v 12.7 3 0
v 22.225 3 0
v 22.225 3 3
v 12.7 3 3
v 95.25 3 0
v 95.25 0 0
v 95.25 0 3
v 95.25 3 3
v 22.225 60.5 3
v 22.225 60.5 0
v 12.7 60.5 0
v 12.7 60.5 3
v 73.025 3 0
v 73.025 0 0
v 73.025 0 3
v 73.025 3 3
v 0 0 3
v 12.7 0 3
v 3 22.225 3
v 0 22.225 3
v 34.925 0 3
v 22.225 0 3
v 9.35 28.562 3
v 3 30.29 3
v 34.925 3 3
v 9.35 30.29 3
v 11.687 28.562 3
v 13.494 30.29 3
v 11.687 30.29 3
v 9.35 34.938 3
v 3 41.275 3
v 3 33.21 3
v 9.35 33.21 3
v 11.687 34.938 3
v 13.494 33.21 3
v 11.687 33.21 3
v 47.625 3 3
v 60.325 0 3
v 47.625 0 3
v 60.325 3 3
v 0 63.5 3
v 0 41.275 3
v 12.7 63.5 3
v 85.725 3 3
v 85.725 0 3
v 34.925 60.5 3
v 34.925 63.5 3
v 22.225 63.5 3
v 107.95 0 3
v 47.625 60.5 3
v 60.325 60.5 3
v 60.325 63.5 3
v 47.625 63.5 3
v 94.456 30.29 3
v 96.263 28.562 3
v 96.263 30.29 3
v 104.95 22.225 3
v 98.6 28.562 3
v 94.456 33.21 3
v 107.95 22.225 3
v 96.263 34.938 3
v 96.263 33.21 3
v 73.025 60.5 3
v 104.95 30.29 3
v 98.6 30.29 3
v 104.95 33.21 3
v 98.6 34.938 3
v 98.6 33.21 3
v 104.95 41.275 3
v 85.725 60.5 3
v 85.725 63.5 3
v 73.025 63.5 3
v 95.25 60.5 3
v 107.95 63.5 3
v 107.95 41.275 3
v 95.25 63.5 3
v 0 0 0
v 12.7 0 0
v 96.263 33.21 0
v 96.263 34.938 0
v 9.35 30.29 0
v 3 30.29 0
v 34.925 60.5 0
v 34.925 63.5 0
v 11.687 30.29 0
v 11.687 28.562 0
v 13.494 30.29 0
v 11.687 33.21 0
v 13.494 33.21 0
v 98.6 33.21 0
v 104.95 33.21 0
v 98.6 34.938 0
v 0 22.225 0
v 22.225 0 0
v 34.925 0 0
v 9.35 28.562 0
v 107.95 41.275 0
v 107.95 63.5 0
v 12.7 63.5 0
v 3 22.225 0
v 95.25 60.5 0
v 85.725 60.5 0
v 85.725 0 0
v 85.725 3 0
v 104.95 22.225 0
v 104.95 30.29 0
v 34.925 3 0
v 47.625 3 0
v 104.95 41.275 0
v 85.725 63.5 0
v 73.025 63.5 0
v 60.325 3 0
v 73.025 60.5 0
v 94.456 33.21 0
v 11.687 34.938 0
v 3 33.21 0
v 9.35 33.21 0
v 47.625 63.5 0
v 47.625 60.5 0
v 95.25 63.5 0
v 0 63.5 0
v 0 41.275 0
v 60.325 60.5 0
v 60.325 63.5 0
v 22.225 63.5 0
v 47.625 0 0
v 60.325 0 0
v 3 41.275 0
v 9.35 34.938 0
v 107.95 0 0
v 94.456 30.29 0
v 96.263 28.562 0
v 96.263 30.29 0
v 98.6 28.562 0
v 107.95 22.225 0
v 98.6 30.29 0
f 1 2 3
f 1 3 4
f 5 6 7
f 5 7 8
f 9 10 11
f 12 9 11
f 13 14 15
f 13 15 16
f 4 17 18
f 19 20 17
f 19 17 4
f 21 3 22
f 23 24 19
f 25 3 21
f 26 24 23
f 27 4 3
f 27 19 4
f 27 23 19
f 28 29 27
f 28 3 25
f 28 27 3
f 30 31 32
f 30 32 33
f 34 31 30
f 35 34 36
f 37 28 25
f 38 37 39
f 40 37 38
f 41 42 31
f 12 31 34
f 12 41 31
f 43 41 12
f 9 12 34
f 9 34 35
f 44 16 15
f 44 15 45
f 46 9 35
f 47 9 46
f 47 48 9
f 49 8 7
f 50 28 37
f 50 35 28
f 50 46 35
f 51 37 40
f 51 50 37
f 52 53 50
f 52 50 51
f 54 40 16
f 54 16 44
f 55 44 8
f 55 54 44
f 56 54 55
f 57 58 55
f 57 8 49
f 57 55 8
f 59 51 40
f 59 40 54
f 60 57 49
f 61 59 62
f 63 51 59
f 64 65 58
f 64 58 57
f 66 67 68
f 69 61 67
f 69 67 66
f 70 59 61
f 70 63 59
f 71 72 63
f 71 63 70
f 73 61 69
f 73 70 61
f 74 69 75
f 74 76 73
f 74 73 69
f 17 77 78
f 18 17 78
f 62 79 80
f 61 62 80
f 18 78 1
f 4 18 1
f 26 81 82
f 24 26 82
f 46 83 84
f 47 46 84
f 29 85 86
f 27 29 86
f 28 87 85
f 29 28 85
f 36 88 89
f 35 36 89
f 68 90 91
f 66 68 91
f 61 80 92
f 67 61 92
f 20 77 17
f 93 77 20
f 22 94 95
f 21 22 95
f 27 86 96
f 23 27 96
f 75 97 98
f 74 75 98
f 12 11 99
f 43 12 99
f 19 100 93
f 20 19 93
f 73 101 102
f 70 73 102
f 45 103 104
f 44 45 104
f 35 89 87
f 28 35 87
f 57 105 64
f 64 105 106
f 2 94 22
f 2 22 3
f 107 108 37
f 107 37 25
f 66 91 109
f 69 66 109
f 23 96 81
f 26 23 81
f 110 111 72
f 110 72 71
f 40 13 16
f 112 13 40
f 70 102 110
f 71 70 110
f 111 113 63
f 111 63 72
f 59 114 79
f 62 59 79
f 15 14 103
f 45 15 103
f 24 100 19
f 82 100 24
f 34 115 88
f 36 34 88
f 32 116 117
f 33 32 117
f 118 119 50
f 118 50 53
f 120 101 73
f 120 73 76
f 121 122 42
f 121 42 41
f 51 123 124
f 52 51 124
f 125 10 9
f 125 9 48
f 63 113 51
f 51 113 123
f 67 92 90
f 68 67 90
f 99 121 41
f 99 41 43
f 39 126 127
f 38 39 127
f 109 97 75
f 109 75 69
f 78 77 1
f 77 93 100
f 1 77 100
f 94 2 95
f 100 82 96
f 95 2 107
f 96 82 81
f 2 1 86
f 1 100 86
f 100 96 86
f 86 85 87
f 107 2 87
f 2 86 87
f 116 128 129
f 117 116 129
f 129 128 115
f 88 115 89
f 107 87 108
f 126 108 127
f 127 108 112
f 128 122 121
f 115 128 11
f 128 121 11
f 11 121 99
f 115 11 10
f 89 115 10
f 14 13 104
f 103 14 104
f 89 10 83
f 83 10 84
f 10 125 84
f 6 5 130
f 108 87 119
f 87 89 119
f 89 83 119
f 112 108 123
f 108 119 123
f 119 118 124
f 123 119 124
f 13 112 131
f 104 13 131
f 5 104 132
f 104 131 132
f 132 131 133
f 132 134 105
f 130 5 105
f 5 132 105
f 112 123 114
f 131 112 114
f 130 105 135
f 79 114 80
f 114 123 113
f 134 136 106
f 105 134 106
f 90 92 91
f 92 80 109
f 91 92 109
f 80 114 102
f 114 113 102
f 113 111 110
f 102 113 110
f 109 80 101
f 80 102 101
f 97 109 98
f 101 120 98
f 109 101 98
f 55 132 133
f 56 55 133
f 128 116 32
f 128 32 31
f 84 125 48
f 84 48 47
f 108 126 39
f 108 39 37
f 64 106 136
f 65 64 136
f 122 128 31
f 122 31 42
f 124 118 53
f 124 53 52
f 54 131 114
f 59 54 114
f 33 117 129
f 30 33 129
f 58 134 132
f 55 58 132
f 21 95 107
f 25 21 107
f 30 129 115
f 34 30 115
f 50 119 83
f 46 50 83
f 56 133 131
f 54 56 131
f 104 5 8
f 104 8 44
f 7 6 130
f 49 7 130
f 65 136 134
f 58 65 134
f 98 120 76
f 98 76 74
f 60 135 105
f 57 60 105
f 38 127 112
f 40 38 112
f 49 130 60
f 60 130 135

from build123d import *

# Parameters (mm, degrees)
SKETCH1_W           = 107.95
SKETCH1_H           = 63.5
BOSS_EXTRUDE1_DEPTH = 3
CUT_EXTRUDE1_REACH  = 127.278
SKETCH2_W           = 12.7
SKETCH2_H           = 3
SKETCH2_W_2         = 9.525
SKETCH2_W_3         = 3
SKETCH2_H_2         = 19.05
CUT_EXTRUDE2_REACH  = 127.278


with BuildPart() as part:
    # Sketch1 → Boss-Extrude1 (new body)
    with BuildSketch(Plane.XY):
        with Locations((53.975, 31.75)):
            Rectangle(SKETCH1_W, SKETCH1_H)
    extrude(amount=BOSS_EXTRUDE1_DEPTH)

    # Sketch2 → Cut-Extrude1 (cut, up to next)
    with BuildSketch(Plane(origin=(0, 0, 0), x_dir=(-1, 0, 0), z_dir=(0, 0, -1)), mode=Mode.PRIVATE) as cut_extrude1_sk1:
        with Locations((-66.675, 1.5)):
            Rectangle(SKETCH2_W, SKETCH2_H)
    cut_extrude1_tool1 = extrude(cut_extrude1_sk1.sketch, amount=-CUT_EXTRUDE1_REACH, mode=Mode.PRIVATE) & part.part
    # Sketch2 → Cut-Extrude1 (cut, up to next)
    with BuildSketch(Plane(origin=(0, 0, 0), x_dir=(-1, 0, 0), z_dir=(0, 0, -1)), mode=Mode.PRIVATE) as cut_extrude1_sk2:
        with Locations((-17.4625, 1.5)):
            Rectangle(SKETCH2_W_2, SKETCH2_H)
    cut_extrude1_tool2 = extrude(cut_extrude1_sk2.sketch, amount=-CUT_EXTRUDE1_REACH, mode=Mode.PRIVATE) & part.part
    # Sketch2 → Cut-Extrude1 (cut, up to next)
    with BuildSketch(Plane(origin=(0, 0, 0), x_dir=(-1, 0, 0), z_dir=(0, 0, -1)), mode=Mode.PRIVATE) as cut_extrude1_sk3:
        with Locations((-90.4875, 1.5)):
            Rectangle(SKETCH2_W_2, SKETCH2_H)
    cut_extrude1_tool3 = extrude(cut_extrude1_sk3.sketch, amount=-CUT_EXTRUDE1_REACH, mode=Mode.PRIVATE) & part.part
    # Sketch2 → Cut-Extrude1 (cut, up to next)
    with BuildSketch(Plane(origin=(0, 0, 0), x_dir=(-1, 0, 0), z_dir=(0, 0, -1)), mode=Mode.PRIVATE) as cut_extrude1_sk4:
        with Locations((-41.275, 1.5)):
            Rectangle(SKETCH2_W, SKETCH2_H)
    cut_extrude1_tool4 = extrude(cut_extrude1_sk4.sketch, amount=-CUT_EXTRUDE1_REACH, mode=Mode.PRIVATE) & part.part
    # Sketch2 → Cut-Extrude1 (cut, up to next)
    with BuildSketch(Plane(origin=(0, 0, 0), x_dir=(-1, 0, 0), z_dir=(0, 0, -1)), mode=Mode.PRIVATE) as cut_extrude1_sk5:
        with Locations((-41.275, 62)):
            Rectangle(SKETCH2_W, SKETCH2_H)
    cut_extrude1_tool5 = extrude(cut_extrude1_sk5.sketch, amount=-CUT_EXTRUDE1_REACH, mode=Mode.PRIVATE) & part.part
    # Sketch2 → Cut-Extrude1 (cut, up to next)
    with BuildSketch(Plane(origin=(0, 0, 0), x_dir=(-1, 0, 0), z_dir=(0, 0, -1)), mode=Mode.PRIVATE) as cut_extrude1_sk6:
        with Locations((-66.675, 62)):
            Rectangle(SKETCH2_W, SKETCH2_H)
    cut_extrude1_tool6 = extrude(cut_extrude1_sk6.sketch, amount=-CUT_EXTRUDE1_REACH, mode=Mode.PRIVATE) & part.part
    # Sketch2 → Cut-Extrude1 (cut, up to next)
    with BuildSketch(Plane(origin=(0, 0, 0), x_dir=(-1, 0, 0), z_dir=(0, 0, -1)), mode=Mode.PRIVATE) as cut_extrude1_sk7:
        with Locations((-17.4625, 62)):
            Rectangle(SKETCH2_W_2, SKETCH2_H)
    cut_extrude1_tool7 = extrude(cut_extrude1_sk7.sketch, amount=-CUT_EXTRUDE1_REACH, mode=Mode.PRIVATE) & part.part
    # Sketch2 → Cut-Extrude1 (cut, up to next)
    with BuildSketch(Plane(origin=(0, 0, 0), x_dir=(-1, 0, 0), z_dir=(0, 0, -1)), mode=Mode.PRIVATE) as cut_extrude1_sk8:
        with Locations((-106.45, 31.75)):
            Rectangle(SKETCH2_W_3, SKETCH2_H_2)
    cut_extrude1_tool8 = extrude(cut_extrude1_sk8.sketch, amount=-CUT_EXTRUDE1_REACH, mode=Mode.PRIVATE) & part.part
    # Sketch2 → Cut-Extrude1 (cut, up to next)
    with BuildSketch(Plane(origin=(0, 0, 0), x_dir=(-1, 0, 0), z_dir=(0, 0, -1)), mode=Mode.PRIVATE) as cut_extrude1_sk9:
        with Locations((-1.5, 31.75)):
            Rectangle(SKETCH2_W_3, SKETCH2_H_2)
    cut_extrude1_tool9 = extrude(cut_extrude1_sk9.sketch, amount=-CUT_EXTRUDE1_REACH, mode=Mode.PRIVATE) & part.part
    # Sketch2 → Cut-Extrude1 (cut, up to next)
    with BuildSketch(Plane(origin=(0, 0, 0), x_dir=(-1, 0, 0), z_dir=(0, 0, -1)), mode=Mode.PRIVATE) as cut_extrude1_sk10:
        with Locations((-90.4875, 62)):
            Rectangle(SKETCH2_W_2, SKETCH2_H)
    cut_extrude1_tool10 = extrude(cut_extrude1_sk10.sketch, amount=-CUT_EXTRUDE1_REACH, mode=Mode.PRIVATE) & part.part
    add(cut_extrude1_tool1.solids().sort_by_distance((66.675, 1.5, 0))[0], mode=Mode.SUBTRACT)
    add(cut_extrude1_tool2.solids().sort_by_distance((17.4625, 1.5, 0))[0], mode=Mode.SUBTRACT)
    add(cut_extrude1_tool3.solids().sort_by_distance((90.4875, 1.5, 0))[0], mode=Mode.SUBTRACT)
    add(cut_extrude1_tool4.solids().sort_by_distance((41.275, 1.5, 0))[0], mode=Mode.SUBTRACT)
    add(cut_extrude1_tool5.solids().sort_by_distance((41.275, 62, 0))[0], mode=Mode.SUBTRACT)
    add(cut_extrude1_tool6.solids().sort_by_distance((66.675, 62, 0))[0], mode=Mode.SUBTRACT)
    add(cut_extrude1_tool7.solids().sort_by_distance((17.4625, 62, 0))[0], mode=Mode.SUBTRACT)
    add(cut_extrude1_tool8.solids().sort_by_distance((106.45, 31.75, 0))[0], mode=Mode.SUBTRACT)
    add(cut_extrude1_tool9.solids().sort_by_distance((1.5, 31.75, 0))[0], mode=Mode.SUBTRACT)
    add(cut_extrude1_tool10.solids().sort_by_distance((90.4875, 62, 0))[0], mode=Mode.SUBTRACT)

    # Sketch3 → Cut-Extrude2 (cut, up to next)
    with BuildSketch(Plane(origin=(0, 0, 0), x_dir=(-1, 0, 0), z_dir=(0, 0, -1)), mode=Mode.PRIVATE) as cut_extrude2_sk1:
        Polygon((-3, 33.2105), (-9.35, 33.2105), (-9.35, 34.9377), (-11.6868, 34.9377), (-11.6868, 33.2105), (-13.49375, 33.2105), (-13.49375, 31.75), (-13.49375, 30.2895), (-11.6868, 30.2895), (-11.6868, 28.5623), (-9.35, 28.5623), (-9.35, 30.2895), (-3, 30.2895), (-3, 31.75), align=None)
    cut_extrude2_tool1 = extrude(cut_extrude2_sk1.sketch, amount=-CUT_EXTRUDE2_REACH, mode=Mode.PRIVATE) & part.part
    # Sketch3 → Cut-Extrude2 (cut, up to next)
    with BuildSketch(Plane(origin=(0, 0, 0), x_dir=(-1, 0, 0), z_dir=(0, 0, -1)), mode=Mode.PRIVATE) as cut_extrude2_sk2:
        Polygon((-94.45625, 30.2895), (-94.45625, 31.75), (-94.45625, 33.2105), (-96.2632, 33.2105), (-96.2632, 34.9377), (-98.6, 34.9377), (-98.6, 33.2105), (-104.95, 33.2105), (-104.95, 31.75), (-104.95, 30.2895), (-98.6, 30.2895), (-98.6, 28.5623), (-96.2632, 28.5623), (-96.2632, 30.2895), align=None)
    cut_extrude2_tool2 = extrude(cut_extrude2_sk2.sketch, amount=-CUT_EXTRUDE2_REACH, mode=Mode.PRIVATE) & part.part
    add(cut_extrude2_tool1.solids().sort_by_distance((8.720382, 31.75, 0))[0], mode=Mode.SUBTRACT)
    add(cut_extrude2_tool2.solids().sort_by_distance((99.229618, 31.75, 0))[0], mode=Mode.SUBTRACT)


solid = part.part
